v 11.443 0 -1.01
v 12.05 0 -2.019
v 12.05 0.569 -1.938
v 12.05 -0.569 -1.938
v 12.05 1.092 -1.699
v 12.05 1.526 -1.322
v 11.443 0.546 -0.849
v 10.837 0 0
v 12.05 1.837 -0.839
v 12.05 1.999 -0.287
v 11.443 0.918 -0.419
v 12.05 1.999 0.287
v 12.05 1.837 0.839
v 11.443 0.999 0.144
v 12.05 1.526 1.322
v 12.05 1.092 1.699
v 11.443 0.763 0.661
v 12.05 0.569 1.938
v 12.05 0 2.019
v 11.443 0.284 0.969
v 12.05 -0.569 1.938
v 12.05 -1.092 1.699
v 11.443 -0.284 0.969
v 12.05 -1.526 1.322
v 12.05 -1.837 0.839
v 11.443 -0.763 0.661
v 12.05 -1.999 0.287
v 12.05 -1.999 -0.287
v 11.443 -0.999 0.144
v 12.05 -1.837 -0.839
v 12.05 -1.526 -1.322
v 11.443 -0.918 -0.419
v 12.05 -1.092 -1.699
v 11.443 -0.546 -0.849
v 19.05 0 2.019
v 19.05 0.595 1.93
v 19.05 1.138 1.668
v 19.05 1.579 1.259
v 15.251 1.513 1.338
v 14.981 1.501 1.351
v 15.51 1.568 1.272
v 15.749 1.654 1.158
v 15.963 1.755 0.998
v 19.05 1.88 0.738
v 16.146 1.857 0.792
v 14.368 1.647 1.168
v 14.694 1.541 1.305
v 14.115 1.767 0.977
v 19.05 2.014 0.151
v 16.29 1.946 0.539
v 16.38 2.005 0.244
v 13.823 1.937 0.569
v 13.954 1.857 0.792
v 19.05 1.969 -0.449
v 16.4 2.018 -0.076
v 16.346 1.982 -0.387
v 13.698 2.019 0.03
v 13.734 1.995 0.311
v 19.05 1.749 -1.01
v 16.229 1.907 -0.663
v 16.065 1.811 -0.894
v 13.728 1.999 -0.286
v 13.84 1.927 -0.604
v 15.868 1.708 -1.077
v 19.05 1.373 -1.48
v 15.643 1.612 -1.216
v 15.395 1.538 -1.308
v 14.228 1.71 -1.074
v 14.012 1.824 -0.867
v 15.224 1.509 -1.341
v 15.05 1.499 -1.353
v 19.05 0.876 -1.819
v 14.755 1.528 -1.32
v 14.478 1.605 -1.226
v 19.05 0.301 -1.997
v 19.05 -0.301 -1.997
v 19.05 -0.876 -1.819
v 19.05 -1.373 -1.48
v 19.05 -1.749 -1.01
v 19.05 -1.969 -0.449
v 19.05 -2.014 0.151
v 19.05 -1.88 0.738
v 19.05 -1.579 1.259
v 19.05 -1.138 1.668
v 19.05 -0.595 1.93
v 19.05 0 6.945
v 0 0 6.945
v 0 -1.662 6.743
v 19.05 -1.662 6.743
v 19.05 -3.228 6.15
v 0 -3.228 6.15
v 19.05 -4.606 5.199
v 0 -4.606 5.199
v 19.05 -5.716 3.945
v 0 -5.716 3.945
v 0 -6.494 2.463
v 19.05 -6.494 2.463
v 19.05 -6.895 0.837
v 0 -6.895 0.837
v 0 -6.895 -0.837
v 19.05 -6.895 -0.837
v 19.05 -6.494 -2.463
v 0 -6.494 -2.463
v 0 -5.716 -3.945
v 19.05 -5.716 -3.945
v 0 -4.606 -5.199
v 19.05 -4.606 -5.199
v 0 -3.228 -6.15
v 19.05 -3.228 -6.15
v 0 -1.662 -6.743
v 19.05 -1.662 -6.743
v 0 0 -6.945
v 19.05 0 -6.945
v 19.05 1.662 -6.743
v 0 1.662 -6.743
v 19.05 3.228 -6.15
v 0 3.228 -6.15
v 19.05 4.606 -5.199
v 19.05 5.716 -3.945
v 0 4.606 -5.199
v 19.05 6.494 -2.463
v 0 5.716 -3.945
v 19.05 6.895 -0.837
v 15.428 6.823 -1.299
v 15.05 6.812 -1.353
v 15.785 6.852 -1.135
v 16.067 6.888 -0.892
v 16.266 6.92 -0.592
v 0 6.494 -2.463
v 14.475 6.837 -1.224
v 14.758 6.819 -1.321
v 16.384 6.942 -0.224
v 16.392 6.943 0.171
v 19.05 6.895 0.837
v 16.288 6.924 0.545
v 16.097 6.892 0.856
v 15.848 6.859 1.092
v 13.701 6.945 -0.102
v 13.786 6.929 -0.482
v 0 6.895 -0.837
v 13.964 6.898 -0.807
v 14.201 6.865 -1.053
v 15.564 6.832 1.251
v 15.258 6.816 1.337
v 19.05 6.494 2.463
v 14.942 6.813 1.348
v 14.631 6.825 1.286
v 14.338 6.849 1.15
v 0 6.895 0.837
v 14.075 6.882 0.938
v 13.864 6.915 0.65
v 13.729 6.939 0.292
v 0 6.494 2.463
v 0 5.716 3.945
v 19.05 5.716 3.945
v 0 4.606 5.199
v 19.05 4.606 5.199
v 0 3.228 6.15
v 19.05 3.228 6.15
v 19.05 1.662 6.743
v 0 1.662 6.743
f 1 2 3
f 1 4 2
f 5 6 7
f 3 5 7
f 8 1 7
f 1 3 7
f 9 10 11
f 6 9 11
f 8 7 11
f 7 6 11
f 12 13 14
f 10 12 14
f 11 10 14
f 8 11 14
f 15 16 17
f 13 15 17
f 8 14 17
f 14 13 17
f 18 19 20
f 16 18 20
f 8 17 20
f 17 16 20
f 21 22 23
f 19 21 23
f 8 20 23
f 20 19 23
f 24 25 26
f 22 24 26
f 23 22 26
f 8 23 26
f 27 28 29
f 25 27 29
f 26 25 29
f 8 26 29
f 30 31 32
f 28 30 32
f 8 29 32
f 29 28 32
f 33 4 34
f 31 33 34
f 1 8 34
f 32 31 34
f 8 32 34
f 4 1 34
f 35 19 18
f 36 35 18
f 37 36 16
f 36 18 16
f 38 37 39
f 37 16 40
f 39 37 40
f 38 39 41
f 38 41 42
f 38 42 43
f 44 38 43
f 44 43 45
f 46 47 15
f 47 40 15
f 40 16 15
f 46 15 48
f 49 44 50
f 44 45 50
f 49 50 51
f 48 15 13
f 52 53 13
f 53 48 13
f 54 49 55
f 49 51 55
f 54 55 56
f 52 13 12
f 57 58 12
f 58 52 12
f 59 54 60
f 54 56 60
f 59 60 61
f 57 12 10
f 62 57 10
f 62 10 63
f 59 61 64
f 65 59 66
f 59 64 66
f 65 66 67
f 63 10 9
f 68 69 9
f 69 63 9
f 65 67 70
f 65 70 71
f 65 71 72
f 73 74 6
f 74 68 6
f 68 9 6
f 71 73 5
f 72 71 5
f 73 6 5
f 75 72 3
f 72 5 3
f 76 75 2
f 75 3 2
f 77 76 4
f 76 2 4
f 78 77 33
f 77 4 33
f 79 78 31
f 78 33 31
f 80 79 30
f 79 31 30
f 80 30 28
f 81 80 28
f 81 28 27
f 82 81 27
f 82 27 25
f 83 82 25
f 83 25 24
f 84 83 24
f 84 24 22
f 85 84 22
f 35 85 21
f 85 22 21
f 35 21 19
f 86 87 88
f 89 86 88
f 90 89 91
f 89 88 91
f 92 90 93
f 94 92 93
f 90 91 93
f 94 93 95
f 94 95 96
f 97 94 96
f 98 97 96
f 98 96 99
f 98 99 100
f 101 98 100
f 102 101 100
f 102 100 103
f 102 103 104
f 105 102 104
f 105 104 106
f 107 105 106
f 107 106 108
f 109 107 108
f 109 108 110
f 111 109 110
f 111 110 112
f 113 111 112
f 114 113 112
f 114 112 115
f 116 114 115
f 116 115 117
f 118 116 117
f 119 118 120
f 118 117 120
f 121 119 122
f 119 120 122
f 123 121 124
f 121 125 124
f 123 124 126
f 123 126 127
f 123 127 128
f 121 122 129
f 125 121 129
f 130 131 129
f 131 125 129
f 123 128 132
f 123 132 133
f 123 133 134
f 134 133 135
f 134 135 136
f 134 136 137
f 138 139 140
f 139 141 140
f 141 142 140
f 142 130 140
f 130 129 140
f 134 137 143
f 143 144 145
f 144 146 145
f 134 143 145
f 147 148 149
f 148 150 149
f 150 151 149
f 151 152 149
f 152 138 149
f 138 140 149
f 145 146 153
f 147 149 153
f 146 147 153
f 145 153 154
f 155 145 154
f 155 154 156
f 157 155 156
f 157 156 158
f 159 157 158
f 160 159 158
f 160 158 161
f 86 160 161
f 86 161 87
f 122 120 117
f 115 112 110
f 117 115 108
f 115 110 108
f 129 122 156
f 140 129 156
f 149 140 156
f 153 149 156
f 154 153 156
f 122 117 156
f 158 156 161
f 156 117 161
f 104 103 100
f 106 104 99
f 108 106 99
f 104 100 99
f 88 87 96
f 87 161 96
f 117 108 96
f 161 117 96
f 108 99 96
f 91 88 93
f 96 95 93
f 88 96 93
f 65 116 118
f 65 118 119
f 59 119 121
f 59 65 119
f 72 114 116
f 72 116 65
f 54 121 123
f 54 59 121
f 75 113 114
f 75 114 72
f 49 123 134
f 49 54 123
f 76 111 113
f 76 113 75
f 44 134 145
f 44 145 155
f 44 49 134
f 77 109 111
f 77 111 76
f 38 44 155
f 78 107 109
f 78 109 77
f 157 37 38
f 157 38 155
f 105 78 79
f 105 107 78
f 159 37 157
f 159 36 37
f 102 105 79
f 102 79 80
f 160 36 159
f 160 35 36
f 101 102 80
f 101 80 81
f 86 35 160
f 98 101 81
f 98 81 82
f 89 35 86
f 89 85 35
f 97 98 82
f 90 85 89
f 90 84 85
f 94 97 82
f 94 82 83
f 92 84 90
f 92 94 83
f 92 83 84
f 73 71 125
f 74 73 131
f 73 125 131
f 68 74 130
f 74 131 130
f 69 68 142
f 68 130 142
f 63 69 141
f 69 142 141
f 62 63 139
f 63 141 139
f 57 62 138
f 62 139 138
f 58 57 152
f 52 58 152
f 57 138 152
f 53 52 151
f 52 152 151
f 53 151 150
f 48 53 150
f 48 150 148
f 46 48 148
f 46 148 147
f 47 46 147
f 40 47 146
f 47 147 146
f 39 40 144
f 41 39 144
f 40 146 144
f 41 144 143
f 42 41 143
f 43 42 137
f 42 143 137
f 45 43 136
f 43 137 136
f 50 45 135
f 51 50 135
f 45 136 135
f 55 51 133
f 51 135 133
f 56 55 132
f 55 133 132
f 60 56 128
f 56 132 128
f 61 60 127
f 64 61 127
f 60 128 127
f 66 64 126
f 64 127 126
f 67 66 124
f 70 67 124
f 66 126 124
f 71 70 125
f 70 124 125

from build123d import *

# Parameters (mm, degrees)
SKETCH1_R                       = 6.9453125
BOSS_EXTRUDE1_DEPTH             = 19.05
F_21_0_159_DIAMETER_HOLE1_D     = 4.0386
F_21_0_159_DIAMETER_HOLE1_DEPTH = 7.0000114
F_21_0_159_DIAMETER_HOLE1_TIP   = 1.213317848
SKETCH5_W                       = 1.35255
SKETCH5_H                       = 6.9453125


with BuildPart() as part:
    # Sketch1 → Boss-Extrude1 (new body)
    with BuildSketch(Plane(origin=(0, 0, 0), x_dir=(0, 0, -1), z_dir=(1, 0, 0))):
        with Locations(Location((0, 0, 0), (0, 0, 180))):
            Circle(SKETCH1_R)
    extrude(amount=BOSS_EXTRUDE1_DEPTH)

    # #21 (0.159) Diameter Hole1
    with Locations(Plane(origin=(19.05, 0, 0), x_dir=(0, 0, -1), z_dir=(1, 0, 0))):
        with Locations((0, 0)):
            Hole(F_21_0_159_DIAMETER_HOLE1_D / 2, depth=F_21_0_159_DIAMETER_HOLE1_DEPTH)
            with Locations((0, 0, -(F_21_0_159_DIAMETER_HOLE1_DEPTH + F_21_0_159_DIAMETER_HOLE1_TIP / 2))):  # 118° drill point
                Cone(0, F_21_0_159_DIAMETER_HOLE1_D / 2, F_21_0_159_DIAMETER_HOLE1_TIP, mode=Mode.SUBTRACT)

    # Sketch5 → #6-32 Tapped Hole1 (revolve, cut)
    with BuildSketch(Plane(origin=(15.05, 0, 0), x_dir=(0, 0, -1), z_dir=(1, 0, 0))):
        with Locations((0.676275, 3.47265625)):
            Rectangle(SKETCH5_W, SKETCH5_H)
    revolve(axis=Axis((15.05, -6.35, 0), (0, 1, 0)), mode=Mode.SUBTRACT)


solid = part.part
